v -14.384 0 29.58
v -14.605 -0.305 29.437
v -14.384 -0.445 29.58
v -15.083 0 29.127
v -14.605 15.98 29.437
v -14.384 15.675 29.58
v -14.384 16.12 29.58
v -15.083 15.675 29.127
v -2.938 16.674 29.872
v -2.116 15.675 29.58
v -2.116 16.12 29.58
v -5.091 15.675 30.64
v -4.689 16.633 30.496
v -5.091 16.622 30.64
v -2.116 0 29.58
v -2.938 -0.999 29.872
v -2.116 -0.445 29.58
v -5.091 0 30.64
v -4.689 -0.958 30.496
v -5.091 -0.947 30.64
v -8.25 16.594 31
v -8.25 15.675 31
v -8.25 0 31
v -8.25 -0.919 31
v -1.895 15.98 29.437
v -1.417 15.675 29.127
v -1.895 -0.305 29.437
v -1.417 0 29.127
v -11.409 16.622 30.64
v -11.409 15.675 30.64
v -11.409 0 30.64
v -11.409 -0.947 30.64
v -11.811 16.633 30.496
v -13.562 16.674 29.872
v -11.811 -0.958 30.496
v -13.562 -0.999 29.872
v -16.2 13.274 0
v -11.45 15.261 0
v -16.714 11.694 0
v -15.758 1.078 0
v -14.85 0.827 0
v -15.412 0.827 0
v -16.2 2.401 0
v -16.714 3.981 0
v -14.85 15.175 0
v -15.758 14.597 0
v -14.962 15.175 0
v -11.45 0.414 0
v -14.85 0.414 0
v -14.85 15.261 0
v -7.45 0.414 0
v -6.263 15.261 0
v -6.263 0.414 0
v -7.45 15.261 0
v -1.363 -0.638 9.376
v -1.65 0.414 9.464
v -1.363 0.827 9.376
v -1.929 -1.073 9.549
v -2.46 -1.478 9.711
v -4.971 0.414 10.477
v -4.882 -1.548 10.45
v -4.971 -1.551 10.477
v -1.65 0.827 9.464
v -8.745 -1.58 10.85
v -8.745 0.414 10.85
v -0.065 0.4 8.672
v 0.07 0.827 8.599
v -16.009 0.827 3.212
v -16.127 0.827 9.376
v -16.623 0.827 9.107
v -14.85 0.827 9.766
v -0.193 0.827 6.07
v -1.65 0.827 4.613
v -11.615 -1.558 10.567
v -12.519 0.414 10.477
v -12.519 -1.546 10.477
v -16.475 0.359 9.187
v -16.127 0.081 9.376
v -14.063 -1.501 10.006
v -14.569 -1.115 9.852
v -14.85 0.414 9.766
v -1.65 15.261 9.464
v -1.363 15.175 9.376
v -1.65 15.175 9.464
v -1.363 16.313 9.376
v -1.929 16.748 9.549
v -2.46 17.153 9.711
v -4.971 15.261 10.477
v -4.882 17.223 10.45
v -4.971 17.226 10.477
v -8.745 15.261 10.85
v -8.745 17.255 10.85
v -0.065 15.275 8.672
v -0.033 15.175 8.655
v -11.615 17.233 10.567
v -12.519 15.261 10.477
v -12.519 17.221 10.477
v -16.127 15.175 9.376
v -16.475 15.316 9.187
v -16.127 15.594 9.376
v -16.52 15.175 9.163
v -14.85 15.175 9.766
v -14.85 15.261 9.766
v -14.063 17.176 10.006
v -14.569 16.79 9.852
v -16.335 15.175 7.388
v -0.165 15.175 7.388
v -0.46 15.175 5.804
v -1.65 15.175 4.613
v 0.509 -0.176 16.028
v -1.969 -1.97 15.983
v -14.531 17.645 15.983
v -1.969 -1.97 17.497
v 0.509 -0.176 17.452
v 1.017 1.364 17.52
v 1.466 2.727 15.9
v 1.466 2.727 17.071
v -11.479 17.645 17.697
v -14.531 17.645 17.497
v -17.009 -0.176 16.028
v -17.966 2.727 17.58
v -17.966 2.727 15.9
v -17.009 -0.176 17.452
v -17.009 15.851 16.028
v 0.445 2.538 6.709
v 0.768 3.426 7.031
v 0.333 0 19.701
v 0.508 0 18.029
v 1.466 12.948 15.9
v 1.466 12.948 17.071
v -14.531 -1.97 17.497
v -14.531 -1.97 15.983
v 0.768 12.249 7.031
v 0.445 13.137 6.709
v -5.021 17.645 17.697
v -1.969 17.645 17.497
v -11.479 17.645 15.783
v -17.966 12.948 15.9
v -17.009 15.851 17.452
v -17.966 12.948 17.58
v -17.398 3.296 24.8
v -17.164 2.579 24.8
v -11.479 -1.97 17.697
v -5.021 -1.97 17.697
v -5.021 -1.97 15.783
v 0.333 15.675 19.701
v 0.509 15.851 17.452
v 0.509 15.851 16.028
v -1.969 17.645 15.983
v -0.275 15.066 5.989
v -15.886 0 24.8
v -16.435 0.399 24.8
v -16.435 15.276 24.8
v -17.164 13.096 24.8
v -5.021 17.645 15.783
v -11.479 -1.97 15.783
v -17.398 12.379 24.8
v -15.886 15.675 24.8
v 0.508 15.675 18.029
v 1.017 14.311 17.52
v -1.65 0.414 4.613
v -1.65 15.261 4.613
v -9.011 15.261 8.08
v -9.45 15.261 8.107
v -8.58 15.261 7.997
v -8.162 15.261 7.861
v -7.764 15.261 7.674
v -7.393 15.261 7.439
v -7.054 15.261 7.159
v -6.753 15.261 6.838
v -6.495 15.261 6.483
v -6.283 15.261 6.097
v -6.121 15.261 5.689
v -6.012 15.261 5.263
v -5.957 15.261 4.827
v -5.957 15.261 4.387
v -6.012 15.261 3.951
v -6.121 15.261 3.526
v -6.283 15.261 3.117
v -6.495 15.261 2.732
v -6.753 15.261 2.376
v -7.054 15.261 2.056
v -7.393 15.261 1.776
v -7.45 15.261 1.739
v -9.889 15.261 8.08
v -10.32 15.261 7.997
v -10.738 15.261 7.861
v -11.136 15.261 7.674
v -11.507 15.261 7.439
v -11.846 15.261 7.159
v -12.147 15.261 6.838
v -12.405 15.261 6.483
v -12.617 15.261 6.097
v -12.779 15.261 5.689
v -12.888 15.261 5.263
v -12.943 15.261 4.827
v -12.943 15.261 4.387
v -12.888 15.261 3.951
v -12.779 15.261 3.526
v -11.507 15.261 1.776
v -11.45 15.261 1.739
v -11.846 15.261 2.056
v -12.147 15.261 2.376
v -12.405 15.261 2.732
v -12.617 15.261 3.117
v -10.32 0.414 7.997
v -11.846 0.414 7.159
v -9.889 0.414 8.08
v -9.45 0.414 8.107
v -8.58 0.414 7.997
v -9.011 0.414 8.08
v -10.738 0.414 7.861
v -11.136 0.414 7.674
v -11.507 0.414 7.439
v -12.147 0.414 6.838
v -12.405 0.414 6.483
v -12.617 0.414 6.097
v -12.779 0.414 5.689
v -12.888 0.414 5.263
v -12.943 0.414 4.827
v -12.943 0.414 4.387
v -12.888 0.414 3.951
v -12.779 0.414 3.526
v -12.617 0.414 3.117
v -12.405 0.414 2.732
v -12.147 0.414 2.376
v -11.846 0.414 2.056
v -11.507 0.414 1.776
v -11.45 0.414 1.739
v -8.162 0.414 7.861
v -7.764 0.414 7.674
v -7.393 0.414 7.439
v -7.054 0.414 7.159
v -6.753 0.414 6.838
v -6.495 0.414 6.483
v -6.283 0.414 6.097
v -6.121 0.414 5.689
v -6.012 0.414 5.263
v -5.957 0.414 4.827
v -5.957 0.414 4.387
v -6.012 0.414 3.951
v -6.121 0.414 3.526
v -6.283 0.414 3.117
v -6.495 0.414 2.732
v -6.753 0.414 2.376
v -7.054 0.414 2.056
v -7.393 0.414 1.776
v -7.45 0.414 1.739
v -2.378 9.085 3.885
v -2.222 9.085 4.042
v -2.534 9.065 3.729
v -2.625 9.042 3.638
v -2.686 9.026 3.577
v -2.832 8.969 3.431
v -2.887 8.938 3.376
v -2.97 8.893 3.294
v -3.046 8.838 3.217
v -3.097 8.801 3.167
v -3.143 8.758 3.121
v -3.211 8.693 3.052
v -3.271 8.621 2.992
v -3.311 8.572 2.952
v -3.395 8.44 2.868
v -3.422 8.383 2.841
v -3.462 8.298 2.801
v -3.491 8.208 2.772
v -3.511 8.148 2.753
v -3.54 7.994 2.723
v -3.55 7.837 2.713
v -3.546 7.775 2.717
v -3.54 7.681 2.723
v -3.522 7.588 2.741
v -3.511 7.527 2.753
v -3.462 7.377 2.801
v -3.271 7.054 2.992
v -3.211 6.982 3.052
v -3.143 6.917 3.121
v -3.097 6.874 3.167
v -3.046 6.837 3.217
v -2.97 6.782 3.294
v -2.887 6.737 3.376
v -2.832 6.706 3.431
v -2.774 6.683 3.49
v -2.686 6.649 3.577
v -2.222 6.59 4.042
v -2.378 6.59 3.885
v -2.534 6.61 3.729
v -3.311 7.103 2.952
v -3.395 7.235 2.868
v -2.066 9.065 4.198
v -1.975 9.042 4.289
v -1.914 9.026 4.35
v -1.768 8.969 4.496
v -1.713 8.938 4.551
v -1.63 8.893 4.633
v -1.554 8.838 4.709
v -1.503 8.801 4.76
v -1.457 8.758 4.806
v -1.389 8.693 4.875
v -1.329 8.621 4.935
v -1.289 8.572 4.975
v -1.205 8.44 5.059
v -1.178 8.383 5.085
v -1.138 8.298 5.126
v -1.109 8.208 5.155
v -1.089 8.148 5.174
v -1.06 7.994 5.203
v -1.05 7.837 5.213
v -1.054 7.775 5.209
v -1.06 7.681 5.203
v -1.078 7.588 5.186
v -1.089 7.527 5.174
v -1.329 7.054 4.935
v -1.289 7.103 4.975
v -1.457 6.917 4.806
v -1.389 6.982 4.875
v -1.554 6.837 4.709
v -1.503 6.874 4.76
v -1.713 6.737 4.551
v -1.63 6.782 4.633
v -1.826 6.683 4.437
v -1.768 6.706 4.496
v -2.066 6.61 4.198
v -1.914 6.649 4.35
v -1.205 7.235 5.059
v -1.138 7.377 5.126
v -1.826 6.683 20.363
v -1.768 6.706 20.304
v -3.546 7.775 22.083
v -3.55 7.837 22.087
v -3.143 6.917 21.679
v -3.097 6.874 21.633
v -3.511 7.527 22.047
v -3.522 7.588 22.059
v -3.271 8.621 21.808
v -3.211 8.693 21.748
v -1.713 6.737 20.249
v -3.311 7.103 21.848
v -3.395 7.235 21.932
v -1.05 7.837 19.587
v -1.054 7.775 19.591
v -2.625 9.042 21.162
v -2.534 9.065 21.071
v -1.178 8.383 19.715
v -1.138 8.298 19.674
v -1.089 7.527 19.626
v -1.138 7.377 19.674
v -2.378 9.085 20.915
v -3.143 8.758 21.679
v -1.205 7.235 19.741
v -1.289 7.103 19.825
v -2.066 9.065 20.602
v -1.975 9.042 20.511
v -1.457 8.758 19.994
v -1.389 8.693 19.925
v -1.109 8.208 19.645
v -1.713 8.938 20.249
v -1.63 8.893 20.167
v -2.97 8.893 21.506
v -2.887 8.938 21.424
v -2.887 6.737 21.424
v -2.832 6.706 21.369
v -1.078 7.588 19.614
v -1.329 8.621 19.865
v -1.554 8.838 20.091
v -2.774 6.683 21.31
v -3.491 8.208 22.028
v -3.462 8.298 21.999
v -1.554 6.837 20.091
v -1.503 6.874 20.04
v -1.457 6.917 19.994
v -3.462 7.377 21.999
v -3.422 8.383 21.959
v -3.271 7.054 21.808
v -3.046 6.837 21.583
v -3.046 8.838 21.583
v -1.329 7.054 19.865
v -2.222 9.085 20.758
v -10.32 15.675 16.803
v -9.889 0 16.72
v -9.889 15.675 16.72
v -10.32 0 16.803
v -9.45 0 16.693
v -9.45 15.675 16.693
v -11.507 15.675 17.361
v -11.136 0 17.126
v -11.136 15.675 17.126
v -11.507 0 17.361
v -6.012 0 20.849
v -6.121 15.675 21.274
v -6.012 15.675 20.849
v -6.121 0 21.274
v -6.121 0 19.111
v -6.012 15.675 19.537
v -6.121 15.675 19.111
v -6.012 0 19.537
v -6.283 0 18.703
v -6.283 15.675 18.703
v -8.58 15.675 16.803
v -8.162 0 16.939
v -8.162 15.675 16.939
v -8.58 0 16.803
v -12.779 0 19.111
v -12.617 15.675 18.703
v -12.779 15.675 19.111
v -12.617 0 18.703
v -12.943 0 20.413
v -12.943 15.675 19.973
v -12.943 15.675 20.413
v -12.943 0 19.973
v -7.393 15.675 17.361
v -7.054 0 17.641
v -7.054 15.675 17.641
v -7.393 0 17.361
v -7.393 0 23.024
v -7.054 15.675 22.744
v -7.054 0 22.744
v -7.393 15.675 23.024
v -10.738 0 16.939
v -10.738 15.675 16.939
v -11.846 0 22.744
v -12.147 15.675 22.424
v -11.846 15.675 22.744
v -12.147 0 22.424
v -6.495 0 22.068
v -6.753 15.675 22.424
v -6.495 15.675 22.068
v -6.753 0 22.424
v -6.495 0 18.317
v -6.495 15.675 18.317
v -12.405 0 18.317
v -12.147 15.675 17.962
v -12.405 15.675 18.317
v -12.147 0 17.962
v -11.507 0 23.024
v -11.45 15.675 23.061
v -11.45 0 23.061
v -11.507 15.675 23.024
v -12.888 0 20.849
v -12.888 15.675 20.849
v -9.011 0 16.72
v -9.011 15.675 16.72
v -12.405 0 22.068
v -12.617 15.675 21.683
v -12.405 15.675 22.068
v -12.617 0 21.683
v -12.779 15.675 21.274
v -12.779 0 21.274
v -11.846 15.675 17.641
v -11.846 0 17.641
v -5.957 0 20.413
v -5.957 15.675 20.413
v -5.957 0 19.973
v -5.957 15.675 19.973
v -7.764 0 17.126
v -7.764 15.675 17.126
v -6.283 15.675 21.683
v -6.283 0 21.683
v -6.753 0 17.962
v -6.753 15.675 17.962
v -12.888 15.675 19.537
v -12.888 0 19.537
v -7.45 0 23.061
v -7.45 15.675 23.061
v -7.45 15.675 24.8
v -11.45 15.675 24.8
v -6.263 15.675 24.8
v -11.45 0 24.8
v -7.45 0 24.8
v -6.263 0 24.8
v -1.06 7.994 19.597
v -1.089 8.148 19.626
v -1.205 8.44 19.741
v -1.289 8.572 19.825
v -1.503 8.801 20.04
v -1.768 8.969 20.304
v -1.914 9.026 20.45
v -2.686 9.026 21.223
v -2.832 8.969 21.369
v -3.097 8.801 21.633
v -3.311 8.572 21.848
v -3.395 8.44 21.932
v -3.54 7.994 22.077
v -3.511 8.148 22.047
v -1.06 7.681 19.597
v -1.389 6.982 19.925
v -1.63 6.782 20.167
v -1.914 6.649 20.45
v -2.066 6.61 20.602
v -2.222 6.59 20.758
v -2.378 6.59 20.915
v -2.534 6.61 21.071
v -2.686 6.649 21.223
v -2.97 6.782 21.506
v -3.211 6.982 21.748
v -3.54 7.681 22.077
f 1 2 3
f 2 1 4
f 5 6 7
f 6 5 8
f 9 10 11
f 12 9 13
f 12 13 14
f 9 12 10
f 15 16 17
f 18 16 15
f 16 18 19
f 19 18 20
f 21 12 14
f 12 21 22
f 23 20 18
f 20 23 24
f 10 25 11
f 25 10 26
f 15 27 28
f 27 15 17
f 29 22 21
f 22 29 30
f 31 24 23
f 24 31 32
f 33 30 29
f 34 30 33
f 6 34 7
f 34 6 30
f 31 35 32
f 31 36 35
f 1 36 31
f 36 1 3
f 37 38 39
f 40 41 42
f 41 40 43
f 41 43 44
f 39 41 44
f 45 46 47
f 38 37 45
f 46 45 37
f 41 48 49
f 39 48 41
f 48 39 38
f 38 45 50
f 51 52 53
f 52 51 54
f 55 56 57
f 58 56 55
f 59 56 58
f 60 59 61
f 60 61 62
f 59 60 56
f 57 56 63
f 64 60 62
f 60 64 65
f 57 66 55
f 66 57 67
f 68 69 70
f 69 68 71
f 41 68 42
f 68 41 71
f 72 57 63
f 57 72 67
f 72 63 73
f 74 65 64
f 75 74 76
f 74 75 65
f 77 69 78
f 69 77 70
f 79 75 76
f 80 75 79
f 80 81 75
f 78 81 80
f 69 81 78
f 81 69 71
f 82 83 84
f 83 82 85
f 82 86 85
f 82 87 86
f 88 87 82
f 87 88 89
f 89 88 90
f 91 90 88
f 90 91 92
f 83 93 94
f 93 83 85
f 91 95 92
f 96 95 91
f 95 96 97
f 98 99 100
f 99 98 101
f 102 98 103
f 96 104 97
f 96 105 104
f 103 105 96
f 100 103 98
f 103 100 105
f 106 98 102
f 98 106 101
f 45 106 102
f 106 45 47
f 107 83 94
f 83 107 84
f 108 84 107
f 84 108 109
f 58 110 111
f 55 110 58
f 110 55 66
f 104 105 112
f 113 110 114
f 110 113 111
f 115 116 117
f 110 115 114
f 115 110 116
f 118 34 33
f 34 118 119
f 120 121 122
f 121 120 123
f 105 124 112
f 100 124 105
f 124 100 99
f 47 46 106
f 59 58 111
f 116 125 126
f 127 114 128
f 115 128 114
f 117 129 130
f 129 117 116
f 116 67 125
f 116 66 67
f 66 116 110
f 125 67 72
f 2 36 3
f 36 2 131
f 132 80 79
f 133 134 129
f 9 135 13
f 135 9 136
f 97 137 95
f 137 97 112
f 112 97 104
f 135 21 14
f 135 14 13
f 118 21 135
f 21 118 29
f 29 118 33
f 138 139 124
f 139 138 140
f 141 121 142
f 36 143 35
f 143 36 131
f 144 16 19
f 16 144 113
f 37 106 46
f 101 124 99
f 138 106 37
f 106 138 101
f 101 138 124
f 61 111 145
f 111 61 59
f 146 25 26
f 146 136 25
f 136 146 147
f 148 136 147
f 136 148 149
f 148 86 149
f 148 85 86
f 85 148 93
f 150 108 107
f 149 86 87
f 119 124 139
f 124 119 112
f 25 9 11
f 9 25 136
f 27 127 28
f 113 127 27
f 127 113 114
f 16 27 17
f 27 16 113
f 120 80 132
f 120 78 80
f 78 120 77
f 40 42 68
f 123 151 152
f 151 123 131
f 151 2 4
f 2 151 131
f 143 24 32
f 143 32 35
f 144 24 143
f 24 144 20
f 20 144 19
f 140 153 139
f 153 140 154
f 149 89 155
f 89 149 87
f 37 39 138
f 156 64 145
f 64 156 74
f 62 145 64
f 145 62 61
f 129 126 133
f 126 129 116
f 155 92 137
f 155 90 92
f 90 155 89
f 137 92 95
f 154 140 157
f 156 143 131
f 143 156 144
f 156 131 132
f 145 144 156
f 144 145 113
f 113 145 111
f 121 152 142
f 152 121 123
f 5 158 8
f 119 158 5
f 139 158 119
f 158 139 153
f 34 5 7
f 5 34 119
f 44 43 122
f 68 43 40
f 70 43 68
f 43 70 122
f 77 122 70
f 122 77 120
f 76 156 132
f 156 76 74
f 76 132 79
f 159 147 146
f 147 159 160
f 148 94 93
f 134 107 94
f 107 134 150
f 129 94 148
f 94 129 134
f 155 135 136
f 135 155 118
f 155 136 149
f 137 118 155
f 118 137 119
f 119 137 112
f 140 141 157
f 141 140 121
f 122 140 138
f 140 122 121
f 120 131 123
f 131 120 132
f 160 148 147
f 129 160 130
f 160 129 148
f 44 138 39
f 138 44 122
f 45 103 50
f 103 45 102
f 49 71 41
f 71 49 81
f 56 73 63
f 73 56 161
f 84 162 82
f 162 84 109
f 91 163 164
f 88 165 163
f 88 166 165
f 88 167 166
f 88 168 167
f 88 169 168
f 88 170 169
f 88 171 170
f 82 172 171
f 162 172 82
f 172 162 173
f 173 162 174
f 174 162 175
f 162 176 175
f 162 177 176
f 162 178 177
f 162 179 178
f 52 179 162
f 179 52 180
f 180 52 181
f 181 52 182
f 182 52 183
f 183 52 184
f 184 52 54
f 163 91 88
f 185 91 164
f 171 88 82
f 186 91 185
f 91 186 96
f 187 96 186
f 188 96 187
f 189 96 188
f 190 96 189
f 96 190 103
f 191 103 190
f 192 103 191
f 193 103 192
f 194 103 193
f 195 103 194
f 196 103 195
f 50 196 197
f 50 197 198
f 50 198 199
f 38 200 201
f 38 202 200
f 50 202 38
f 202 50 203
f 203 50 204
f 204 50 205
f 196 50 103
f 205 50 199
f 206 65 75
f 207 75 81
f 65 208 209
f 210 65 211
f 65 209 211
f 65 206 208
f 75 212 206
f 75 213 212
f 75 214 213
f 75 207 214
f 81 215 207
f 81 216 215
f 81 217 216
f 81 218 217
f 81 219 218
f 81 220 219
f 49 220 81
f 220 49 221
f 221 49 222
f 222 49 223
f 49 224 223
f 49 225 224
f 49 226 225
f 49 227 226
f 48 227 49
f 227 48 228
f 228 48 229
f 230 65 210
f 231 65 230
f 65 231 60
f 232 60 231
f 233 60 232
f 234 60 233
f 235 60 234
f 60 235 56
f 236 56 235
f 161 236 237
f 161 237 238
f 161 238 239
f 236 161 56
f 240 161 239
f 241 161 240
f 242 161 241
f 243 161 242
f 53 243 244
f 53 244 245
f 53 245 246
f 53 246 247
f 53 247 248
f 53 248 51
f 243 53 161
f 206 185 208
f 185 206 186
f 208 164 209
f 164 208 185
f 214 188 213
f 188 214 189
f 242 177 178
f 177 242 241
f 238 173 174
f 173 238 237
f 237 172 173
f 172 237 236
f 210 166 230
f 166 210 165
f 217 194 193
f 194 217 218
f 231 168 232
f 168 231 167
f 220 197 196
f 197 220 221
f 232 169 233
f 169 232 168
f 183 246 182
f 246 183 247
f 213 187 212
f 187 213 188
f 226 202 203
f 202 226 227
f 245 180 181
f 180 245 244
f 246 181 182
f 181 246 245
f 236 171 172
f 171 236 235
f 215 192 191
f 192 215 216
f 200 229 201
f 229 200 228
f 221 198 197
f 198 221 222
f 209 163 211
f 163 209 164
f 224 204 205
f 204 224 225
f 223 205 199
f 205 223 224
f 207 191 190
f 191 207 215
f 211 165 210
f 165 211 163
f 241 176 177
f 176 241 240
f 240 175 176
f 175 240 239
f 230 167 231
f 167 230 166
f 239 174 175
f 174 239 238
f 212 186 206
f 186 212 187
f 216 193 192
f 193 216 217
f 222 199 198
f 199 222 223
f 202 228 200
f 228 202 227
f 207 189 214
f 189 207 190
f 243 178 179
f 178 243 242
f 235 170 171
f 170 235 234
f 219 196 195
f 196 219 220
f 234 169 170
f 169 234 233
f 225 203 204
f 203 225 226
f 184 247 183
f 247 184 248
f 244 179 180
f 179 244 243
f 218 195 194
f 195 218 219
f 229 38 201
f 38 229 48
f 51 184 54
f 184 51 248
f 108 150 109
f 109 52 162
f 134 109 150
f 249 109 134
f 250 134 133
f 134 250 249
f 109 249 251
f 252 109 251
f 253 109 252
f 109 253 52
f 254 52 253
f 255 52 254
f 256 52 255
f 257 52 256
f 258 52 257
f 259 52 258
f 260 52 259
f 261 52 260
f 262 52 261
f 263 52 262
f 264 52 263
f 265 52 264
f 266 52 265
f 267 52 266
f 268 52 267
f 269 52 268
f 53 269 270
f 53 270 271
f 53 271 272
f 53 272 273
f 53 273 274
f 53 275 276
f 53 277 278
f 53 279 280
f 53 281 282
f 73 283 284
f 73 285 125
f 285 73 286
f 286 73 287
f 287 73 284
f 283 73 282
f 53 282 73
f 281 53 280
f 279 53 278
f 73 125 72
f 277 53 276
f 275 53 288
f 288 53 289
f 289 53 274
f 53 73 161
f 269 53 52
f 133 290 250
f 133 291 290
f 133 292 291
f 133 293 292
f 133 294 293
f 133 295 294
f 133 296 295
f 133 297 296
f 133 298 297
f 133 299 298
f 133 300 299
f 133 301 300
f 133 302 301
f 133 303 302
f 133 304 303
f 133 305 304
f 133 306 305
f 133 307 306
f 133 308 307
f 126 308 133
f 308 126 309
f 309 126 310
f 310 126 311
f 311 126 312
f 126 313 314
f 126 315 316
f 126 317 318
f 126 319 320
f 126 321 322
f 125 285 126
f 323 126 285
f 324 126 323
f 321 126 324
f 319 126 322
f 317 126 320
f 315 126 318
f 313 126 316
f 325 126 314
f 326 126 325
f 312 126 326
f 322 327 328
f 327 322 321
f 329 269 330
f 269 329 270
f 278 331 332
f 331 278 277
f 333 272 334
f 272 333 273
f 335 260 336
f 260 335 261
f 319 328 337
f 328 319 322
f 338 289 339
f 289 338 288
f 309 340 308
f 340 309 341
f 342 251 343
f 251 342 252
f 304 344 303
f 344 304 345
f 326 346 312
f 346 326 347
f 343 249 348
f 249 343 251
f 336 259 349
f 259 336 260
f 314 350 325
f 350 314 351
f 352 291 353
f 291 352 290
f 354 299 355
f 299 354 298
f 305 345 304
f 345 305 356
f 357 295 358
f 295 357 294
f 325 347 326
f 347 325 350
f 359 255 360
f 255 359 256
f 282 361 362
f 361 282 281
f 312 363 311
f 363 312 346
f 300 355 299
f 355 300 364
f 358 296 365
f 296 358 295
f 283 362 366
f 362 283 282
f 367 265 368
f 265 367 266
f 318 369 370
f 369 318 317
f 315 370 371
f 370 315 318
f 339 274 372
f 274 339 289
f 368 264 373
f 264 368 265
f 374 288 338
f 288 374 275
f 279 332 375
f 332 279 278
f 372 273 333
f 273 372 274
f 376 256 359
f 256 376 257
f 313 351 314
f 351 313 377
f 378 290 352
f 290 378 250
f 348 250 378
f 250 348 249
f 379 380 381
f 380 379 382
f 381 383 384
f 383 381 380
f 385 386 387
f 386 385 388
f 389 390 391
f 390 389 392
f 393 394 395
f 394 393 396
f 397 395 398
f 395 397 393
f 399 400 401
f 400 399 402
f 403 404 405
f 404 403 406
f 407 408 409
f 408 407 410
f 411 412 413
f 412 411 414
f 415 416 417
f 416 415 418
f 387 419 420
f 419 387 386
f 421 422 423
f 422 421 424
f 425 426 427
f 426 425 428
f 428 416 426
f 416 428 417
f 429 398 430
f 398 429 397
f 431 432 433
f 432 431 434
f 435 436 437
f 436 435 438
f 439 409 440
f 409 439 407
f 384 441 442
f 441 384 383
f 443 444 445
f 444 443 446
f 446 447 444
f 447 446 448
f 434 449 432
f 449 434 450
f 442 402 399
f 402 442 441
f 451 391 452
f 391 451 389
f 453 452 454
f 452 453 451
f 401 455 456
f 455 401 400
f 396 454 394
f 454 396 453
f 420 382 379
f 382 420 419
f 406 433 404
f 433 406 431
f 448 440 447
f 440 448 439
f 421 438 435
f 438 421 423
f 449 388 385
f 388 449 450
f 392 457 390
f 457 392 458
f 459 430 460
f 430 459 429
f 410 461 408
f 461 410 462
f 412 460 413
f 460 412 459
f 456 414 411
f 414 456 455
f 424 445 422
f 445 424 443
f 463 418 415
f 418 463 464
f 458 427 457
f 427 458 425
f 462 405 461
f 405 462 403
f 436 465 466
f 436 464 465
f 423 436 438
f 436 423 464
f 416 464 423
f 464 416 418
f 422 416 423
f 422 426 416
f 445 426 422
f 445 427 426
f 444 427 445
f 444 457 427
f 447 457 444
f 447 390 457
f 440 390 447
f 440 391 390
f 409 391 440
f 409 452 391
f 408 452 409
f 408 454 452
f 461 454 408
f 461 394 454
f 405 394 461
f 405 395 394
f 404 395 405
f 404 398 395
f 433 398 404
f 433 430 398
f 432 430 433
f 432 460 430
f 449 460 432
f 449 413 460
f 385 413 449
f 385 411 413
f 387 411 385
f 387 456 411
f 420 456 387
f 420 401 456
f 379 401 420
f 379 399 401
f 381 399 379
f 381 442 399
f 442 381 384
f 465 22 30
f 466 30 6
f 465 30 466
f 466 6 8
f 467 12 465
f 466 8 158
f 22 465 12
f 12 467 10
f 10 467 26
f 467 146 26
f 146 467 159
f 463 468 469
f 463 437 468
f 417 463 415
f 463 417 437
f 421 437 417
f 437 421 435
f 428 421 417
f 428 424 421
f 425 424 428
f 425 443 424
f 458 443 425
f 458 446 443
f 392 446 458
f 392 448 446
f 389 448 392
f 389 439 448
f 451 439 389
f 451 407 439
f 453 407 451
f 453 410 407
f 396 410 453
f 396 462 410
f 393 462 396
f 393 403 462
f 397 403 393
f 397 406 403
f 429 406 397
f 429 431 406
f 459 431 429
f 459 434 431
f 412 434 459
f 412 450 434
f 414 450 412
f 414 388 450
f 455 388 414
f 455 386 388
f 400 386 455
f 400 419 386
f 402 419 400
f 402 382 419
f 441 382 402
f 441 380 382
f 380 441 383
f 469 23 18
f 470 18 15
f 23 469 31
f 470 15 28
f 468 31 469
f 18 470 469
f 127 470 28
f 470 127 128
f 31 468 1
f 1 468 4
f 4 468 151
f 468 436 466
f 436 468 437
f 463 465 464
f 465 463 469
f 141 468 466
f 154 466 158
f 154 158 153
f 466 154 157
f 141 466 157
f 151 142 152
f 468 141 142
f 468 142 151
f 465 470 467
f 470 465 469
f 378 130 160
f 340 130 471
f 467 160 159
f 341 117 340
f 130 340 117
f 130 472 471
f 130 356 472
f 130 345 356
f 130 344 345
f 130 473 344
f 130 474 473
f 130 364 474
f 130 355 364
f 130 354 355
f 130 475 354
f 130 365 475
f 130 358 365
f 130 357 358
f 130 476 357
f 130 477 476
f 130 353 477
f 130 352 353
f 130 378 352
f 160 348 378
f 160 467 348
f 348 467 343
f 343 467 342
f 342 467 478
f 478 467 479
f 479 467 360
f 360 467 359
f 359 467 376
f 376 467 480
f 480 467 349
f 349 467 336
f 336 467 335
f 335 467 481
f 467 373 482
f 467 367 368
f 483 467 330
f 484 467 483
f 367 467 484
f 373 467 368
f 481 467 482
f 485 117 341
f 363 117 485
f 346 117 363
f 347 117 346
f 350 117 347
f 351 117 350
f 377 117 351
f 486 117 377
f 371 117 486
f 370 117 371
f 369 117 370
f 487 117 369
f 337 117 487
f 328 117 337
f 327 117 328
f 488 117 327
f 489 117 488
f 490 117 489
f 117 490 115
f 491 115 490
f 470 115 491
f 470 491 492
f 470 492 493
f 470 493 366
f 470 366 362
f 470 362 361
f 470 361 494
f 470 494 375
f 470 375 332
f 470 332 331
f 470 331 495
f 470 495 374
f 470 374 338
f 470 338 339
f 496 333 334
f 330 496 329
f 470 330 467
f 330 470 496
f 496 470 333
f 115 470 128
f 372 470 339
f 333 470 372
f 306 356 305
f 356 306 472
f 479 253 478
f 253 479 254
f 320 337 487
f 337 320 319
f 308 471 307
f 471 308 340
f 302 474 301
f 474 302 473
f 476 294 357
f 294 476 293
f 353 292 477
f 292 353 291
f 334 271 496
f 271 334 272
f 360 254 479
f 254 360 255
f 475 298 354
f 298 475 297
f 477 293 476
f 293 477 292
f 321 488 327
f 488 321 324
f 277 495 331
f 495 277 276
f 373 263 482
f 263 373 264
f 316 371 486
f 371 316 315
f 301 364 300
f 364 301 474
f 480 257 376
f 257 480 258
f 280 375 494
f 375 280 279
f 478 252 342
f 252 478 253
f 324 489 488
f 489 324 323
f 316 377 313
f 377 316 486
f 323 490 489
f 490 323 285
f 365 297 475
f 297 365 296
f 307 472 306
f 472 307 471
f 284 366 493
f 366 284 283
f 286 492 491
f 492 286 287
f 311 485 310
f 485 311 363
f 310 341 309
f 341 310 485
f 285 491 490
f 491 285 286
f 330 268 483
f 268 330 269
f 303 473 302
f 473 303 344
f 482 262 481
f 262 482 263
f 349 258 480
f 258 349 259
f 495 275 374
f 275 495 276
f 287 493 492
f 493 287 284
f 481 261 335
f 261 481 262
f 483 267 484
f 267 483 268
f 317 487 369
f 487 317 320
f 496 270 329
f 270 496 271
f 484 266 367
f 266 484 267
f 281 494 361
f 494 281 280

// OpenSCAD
// file: util/finger_base.scad
include <../../config.scad>

rotate([0,-90,0]) fingerbase();

//	Base segment of finger, can be lengthened
module fingerbase(length=20, proximalHole=true, distalHole=true)
{
	difference() {
		scale([yScaleFactor,xScaleFactor,zScaleFactor]) {
			fingerbasesolid(length);
		}
		if(proximalHole) {
			translate([0,knucklePadding/2 * xScaleFactor,0]) fingerhardwarecutouts(jointDia, jointThick, knuckleW=knuckleW-knucklePadding, fingerLen=length);
		}
		if (distalHole) {
			translate([length * yScaleFactor,0,0]) mirror([1,0,0]) fingerhardwarecutouts(jointDia, jointThick, knuckleW=knuckleW, fingerLen=length);
		}
	}


	
}

module fingerhardwarecutouts(jointDia,jointThick,knuckleW,fingerLen,holeCutoff=100) {
	//slot for flex joint
	translate([7 - (15/jointDia),0,6*zScaleFactor - (1.8/jointThick)]) {
		rotate([90,0,0]) translate([-0.25,0,-knuckleW*xScaleFactor]) cylinder(d=jointDia, h=knuckleW*xScaleFactor, $fn=50);
		translate([-25,(knuckleW*xScaleFactor) / 2,0]) cube([50,knuckleW*xScaleFactor,jointThick], center=true);
	}
	//cubic parts
	translate([-100,0,0]) cube([100,knuckleW*xScaleFactor,100]);
	translate([-13/zScaleFactor,0,0]) rotate([0,45,0]) translate([-50,0,0]) cube([100,knuckleW * xScaleFactor, 10]);

	//channel for string/tendon
	translate([-fingerLen/2 * yScaleFactor, knuckleW/2 * xScaleFactor, 2.3]) rotate([0,90,0]) cylinder(d=2.5, h=holeCutoff, $fn=50);
}

//	base segment of finger, solid
module fingerbasesolid(length=50, cutout=true) {
	difference() {
		//cubic part
		translate([0,0.001 + knucklePadding/2,1]) cube([length, knuckleW - knucklePadding - 0.002, 8]);
	}
	
	//cylindrical-ish part around finger
	intersection() {
		//overly large shape to get the cross section in the XZ plane from
		difference() {
			union() {
				translate([length-4,-5,5]) rotate([-90,0,0]) cylinder(r=8,h=knuckleW + 10);
				translate([0,-5,-5]) cube([length,knuckleW + 10,20]);
			}
			//cutout for the side "guards" of the previous knuckle
			if(cutout) {
				translate([-4,-knuckleW+0.001,5.3]) rotate([-90,0,0]) cylinder(r=11,h=10);
				translate([-4,knuckleW - knucklePadding*(1/xScaleFactor),5.3]) rotate([-90,0,0]) cylinder(r=11,h=10);
			}
		}

		hull() {
			for(i=[-1,1], j=[-1,1]) {
				//angled cylinders to provide the outer shape of the finger
				translate([length/10,i*2.4 + knuckleW/2,j*2.2 + 5]) rotate([i*j*-4,j*86,0]) cylinder(d=6,h=20,center=true);
				translate([length+4, i*2.4 + knuckleW/2, j*2.2 + 5]) rotate([i*j*-4,j*-86,0]) cylinder(d=6,h=20,center=true);
			}
		}
	}
}
// file: ../config.scad
/**
 * Configuration settings for Flexy Beast, required to generate correctly sized STLs of the printed parts. See the Configuration File Assembly instructions to set this up.
 * @id config_file
 * @name Configuration File
 * @category Prerequisites!
 * @step Open config.scad in your favorite text editor.
 * @step As per the normal Cyborg Beast instructions, measure the width of the knuckles in the non-affected hand and convert to millimeters.
 * @step Add 5 to that result and then divide by 55.
 * @step Replace the x-, y-, and zScaleFactor variables in config.scad with that number.
 * @step If desired, adjust the proportions of the hand by changing those variables individually. xScaleFactor controls the width of the hand, yScaleFactor controls the length, and zScaleFactor controls the height.
 * @step Open assembly.scad in OpenSCAD to check that the flexy joint holes are not too large for the hand (should only be necessary for small children). If necessary, reduce the jointDia and jointThick variables. jointDia=5 and jointThick=2 is a good amount for smaller hands.
 * @step Set the fingerPads variable to true or false depending on whether you want to cast silicone finger pads for improved grip.
 * @step Open palm.scad, finger_base.scad, finger_tip.scad, and thumb_tip.scad in OpenSCAD, render each part (F6), and export as STL, then print. Suggested print settings are 0.2mm or smaller layer height, 3 perimeters, and 25% rectilinear or hexagonal infill.
 */

knuckleR = 4.85;
knucklePadding = 0.5;
knuckleW = 9.5;
wristH = 10;
palmH = 20;
palmW = 64;
th = 3;
fn = 32;

//flexy joint parameters
jointDia = 7;
jointThick = 4;

//finger settings
fingerPads = true; //whether or not to hollow the finger tips slightly for molding pads
fingerLength = 1; //multiply the length of all fingers by this amount
thumbProp = 0.8; //proportion of thumb length relative to other fingers (note that the thumb is a segment shorter than the other fingers already)
indexProp = 0.8; //proportion of index finger length relative to other fingers
middleProp = 1; //proportion of middle finger length relative to other fingers
ringProp = 0.8; //proportion of ring finger length relative to other fingers
pinkyProp = 0.7; //proportion of pinky finger length relative to other fingers

//misc settings
thermoform = true; //whether or not to generate a thermoformable mesh for the palm

//desired scale factor for hand based on the standard Cyborg Beast/Robohand sizing guide
xScaleFactor = 1.65; // [1.05:1.60]
yScaleFactor = 1.55; // [1.05:1.60]
zScaleFactor = 1.65; // [1.05:1.60]
// main file
include <../config.scad>
use <util/finger_base.scad>

rotate([0,-90,0]) fingerbase(length = 20 * indexProp * fingerLength);

/**
 * Proximal phalanx for index finger - rendered from parts/finger_index_base.scad
 * @id index_base
 * @name Index Finger Base
 * @category Printed
 */
